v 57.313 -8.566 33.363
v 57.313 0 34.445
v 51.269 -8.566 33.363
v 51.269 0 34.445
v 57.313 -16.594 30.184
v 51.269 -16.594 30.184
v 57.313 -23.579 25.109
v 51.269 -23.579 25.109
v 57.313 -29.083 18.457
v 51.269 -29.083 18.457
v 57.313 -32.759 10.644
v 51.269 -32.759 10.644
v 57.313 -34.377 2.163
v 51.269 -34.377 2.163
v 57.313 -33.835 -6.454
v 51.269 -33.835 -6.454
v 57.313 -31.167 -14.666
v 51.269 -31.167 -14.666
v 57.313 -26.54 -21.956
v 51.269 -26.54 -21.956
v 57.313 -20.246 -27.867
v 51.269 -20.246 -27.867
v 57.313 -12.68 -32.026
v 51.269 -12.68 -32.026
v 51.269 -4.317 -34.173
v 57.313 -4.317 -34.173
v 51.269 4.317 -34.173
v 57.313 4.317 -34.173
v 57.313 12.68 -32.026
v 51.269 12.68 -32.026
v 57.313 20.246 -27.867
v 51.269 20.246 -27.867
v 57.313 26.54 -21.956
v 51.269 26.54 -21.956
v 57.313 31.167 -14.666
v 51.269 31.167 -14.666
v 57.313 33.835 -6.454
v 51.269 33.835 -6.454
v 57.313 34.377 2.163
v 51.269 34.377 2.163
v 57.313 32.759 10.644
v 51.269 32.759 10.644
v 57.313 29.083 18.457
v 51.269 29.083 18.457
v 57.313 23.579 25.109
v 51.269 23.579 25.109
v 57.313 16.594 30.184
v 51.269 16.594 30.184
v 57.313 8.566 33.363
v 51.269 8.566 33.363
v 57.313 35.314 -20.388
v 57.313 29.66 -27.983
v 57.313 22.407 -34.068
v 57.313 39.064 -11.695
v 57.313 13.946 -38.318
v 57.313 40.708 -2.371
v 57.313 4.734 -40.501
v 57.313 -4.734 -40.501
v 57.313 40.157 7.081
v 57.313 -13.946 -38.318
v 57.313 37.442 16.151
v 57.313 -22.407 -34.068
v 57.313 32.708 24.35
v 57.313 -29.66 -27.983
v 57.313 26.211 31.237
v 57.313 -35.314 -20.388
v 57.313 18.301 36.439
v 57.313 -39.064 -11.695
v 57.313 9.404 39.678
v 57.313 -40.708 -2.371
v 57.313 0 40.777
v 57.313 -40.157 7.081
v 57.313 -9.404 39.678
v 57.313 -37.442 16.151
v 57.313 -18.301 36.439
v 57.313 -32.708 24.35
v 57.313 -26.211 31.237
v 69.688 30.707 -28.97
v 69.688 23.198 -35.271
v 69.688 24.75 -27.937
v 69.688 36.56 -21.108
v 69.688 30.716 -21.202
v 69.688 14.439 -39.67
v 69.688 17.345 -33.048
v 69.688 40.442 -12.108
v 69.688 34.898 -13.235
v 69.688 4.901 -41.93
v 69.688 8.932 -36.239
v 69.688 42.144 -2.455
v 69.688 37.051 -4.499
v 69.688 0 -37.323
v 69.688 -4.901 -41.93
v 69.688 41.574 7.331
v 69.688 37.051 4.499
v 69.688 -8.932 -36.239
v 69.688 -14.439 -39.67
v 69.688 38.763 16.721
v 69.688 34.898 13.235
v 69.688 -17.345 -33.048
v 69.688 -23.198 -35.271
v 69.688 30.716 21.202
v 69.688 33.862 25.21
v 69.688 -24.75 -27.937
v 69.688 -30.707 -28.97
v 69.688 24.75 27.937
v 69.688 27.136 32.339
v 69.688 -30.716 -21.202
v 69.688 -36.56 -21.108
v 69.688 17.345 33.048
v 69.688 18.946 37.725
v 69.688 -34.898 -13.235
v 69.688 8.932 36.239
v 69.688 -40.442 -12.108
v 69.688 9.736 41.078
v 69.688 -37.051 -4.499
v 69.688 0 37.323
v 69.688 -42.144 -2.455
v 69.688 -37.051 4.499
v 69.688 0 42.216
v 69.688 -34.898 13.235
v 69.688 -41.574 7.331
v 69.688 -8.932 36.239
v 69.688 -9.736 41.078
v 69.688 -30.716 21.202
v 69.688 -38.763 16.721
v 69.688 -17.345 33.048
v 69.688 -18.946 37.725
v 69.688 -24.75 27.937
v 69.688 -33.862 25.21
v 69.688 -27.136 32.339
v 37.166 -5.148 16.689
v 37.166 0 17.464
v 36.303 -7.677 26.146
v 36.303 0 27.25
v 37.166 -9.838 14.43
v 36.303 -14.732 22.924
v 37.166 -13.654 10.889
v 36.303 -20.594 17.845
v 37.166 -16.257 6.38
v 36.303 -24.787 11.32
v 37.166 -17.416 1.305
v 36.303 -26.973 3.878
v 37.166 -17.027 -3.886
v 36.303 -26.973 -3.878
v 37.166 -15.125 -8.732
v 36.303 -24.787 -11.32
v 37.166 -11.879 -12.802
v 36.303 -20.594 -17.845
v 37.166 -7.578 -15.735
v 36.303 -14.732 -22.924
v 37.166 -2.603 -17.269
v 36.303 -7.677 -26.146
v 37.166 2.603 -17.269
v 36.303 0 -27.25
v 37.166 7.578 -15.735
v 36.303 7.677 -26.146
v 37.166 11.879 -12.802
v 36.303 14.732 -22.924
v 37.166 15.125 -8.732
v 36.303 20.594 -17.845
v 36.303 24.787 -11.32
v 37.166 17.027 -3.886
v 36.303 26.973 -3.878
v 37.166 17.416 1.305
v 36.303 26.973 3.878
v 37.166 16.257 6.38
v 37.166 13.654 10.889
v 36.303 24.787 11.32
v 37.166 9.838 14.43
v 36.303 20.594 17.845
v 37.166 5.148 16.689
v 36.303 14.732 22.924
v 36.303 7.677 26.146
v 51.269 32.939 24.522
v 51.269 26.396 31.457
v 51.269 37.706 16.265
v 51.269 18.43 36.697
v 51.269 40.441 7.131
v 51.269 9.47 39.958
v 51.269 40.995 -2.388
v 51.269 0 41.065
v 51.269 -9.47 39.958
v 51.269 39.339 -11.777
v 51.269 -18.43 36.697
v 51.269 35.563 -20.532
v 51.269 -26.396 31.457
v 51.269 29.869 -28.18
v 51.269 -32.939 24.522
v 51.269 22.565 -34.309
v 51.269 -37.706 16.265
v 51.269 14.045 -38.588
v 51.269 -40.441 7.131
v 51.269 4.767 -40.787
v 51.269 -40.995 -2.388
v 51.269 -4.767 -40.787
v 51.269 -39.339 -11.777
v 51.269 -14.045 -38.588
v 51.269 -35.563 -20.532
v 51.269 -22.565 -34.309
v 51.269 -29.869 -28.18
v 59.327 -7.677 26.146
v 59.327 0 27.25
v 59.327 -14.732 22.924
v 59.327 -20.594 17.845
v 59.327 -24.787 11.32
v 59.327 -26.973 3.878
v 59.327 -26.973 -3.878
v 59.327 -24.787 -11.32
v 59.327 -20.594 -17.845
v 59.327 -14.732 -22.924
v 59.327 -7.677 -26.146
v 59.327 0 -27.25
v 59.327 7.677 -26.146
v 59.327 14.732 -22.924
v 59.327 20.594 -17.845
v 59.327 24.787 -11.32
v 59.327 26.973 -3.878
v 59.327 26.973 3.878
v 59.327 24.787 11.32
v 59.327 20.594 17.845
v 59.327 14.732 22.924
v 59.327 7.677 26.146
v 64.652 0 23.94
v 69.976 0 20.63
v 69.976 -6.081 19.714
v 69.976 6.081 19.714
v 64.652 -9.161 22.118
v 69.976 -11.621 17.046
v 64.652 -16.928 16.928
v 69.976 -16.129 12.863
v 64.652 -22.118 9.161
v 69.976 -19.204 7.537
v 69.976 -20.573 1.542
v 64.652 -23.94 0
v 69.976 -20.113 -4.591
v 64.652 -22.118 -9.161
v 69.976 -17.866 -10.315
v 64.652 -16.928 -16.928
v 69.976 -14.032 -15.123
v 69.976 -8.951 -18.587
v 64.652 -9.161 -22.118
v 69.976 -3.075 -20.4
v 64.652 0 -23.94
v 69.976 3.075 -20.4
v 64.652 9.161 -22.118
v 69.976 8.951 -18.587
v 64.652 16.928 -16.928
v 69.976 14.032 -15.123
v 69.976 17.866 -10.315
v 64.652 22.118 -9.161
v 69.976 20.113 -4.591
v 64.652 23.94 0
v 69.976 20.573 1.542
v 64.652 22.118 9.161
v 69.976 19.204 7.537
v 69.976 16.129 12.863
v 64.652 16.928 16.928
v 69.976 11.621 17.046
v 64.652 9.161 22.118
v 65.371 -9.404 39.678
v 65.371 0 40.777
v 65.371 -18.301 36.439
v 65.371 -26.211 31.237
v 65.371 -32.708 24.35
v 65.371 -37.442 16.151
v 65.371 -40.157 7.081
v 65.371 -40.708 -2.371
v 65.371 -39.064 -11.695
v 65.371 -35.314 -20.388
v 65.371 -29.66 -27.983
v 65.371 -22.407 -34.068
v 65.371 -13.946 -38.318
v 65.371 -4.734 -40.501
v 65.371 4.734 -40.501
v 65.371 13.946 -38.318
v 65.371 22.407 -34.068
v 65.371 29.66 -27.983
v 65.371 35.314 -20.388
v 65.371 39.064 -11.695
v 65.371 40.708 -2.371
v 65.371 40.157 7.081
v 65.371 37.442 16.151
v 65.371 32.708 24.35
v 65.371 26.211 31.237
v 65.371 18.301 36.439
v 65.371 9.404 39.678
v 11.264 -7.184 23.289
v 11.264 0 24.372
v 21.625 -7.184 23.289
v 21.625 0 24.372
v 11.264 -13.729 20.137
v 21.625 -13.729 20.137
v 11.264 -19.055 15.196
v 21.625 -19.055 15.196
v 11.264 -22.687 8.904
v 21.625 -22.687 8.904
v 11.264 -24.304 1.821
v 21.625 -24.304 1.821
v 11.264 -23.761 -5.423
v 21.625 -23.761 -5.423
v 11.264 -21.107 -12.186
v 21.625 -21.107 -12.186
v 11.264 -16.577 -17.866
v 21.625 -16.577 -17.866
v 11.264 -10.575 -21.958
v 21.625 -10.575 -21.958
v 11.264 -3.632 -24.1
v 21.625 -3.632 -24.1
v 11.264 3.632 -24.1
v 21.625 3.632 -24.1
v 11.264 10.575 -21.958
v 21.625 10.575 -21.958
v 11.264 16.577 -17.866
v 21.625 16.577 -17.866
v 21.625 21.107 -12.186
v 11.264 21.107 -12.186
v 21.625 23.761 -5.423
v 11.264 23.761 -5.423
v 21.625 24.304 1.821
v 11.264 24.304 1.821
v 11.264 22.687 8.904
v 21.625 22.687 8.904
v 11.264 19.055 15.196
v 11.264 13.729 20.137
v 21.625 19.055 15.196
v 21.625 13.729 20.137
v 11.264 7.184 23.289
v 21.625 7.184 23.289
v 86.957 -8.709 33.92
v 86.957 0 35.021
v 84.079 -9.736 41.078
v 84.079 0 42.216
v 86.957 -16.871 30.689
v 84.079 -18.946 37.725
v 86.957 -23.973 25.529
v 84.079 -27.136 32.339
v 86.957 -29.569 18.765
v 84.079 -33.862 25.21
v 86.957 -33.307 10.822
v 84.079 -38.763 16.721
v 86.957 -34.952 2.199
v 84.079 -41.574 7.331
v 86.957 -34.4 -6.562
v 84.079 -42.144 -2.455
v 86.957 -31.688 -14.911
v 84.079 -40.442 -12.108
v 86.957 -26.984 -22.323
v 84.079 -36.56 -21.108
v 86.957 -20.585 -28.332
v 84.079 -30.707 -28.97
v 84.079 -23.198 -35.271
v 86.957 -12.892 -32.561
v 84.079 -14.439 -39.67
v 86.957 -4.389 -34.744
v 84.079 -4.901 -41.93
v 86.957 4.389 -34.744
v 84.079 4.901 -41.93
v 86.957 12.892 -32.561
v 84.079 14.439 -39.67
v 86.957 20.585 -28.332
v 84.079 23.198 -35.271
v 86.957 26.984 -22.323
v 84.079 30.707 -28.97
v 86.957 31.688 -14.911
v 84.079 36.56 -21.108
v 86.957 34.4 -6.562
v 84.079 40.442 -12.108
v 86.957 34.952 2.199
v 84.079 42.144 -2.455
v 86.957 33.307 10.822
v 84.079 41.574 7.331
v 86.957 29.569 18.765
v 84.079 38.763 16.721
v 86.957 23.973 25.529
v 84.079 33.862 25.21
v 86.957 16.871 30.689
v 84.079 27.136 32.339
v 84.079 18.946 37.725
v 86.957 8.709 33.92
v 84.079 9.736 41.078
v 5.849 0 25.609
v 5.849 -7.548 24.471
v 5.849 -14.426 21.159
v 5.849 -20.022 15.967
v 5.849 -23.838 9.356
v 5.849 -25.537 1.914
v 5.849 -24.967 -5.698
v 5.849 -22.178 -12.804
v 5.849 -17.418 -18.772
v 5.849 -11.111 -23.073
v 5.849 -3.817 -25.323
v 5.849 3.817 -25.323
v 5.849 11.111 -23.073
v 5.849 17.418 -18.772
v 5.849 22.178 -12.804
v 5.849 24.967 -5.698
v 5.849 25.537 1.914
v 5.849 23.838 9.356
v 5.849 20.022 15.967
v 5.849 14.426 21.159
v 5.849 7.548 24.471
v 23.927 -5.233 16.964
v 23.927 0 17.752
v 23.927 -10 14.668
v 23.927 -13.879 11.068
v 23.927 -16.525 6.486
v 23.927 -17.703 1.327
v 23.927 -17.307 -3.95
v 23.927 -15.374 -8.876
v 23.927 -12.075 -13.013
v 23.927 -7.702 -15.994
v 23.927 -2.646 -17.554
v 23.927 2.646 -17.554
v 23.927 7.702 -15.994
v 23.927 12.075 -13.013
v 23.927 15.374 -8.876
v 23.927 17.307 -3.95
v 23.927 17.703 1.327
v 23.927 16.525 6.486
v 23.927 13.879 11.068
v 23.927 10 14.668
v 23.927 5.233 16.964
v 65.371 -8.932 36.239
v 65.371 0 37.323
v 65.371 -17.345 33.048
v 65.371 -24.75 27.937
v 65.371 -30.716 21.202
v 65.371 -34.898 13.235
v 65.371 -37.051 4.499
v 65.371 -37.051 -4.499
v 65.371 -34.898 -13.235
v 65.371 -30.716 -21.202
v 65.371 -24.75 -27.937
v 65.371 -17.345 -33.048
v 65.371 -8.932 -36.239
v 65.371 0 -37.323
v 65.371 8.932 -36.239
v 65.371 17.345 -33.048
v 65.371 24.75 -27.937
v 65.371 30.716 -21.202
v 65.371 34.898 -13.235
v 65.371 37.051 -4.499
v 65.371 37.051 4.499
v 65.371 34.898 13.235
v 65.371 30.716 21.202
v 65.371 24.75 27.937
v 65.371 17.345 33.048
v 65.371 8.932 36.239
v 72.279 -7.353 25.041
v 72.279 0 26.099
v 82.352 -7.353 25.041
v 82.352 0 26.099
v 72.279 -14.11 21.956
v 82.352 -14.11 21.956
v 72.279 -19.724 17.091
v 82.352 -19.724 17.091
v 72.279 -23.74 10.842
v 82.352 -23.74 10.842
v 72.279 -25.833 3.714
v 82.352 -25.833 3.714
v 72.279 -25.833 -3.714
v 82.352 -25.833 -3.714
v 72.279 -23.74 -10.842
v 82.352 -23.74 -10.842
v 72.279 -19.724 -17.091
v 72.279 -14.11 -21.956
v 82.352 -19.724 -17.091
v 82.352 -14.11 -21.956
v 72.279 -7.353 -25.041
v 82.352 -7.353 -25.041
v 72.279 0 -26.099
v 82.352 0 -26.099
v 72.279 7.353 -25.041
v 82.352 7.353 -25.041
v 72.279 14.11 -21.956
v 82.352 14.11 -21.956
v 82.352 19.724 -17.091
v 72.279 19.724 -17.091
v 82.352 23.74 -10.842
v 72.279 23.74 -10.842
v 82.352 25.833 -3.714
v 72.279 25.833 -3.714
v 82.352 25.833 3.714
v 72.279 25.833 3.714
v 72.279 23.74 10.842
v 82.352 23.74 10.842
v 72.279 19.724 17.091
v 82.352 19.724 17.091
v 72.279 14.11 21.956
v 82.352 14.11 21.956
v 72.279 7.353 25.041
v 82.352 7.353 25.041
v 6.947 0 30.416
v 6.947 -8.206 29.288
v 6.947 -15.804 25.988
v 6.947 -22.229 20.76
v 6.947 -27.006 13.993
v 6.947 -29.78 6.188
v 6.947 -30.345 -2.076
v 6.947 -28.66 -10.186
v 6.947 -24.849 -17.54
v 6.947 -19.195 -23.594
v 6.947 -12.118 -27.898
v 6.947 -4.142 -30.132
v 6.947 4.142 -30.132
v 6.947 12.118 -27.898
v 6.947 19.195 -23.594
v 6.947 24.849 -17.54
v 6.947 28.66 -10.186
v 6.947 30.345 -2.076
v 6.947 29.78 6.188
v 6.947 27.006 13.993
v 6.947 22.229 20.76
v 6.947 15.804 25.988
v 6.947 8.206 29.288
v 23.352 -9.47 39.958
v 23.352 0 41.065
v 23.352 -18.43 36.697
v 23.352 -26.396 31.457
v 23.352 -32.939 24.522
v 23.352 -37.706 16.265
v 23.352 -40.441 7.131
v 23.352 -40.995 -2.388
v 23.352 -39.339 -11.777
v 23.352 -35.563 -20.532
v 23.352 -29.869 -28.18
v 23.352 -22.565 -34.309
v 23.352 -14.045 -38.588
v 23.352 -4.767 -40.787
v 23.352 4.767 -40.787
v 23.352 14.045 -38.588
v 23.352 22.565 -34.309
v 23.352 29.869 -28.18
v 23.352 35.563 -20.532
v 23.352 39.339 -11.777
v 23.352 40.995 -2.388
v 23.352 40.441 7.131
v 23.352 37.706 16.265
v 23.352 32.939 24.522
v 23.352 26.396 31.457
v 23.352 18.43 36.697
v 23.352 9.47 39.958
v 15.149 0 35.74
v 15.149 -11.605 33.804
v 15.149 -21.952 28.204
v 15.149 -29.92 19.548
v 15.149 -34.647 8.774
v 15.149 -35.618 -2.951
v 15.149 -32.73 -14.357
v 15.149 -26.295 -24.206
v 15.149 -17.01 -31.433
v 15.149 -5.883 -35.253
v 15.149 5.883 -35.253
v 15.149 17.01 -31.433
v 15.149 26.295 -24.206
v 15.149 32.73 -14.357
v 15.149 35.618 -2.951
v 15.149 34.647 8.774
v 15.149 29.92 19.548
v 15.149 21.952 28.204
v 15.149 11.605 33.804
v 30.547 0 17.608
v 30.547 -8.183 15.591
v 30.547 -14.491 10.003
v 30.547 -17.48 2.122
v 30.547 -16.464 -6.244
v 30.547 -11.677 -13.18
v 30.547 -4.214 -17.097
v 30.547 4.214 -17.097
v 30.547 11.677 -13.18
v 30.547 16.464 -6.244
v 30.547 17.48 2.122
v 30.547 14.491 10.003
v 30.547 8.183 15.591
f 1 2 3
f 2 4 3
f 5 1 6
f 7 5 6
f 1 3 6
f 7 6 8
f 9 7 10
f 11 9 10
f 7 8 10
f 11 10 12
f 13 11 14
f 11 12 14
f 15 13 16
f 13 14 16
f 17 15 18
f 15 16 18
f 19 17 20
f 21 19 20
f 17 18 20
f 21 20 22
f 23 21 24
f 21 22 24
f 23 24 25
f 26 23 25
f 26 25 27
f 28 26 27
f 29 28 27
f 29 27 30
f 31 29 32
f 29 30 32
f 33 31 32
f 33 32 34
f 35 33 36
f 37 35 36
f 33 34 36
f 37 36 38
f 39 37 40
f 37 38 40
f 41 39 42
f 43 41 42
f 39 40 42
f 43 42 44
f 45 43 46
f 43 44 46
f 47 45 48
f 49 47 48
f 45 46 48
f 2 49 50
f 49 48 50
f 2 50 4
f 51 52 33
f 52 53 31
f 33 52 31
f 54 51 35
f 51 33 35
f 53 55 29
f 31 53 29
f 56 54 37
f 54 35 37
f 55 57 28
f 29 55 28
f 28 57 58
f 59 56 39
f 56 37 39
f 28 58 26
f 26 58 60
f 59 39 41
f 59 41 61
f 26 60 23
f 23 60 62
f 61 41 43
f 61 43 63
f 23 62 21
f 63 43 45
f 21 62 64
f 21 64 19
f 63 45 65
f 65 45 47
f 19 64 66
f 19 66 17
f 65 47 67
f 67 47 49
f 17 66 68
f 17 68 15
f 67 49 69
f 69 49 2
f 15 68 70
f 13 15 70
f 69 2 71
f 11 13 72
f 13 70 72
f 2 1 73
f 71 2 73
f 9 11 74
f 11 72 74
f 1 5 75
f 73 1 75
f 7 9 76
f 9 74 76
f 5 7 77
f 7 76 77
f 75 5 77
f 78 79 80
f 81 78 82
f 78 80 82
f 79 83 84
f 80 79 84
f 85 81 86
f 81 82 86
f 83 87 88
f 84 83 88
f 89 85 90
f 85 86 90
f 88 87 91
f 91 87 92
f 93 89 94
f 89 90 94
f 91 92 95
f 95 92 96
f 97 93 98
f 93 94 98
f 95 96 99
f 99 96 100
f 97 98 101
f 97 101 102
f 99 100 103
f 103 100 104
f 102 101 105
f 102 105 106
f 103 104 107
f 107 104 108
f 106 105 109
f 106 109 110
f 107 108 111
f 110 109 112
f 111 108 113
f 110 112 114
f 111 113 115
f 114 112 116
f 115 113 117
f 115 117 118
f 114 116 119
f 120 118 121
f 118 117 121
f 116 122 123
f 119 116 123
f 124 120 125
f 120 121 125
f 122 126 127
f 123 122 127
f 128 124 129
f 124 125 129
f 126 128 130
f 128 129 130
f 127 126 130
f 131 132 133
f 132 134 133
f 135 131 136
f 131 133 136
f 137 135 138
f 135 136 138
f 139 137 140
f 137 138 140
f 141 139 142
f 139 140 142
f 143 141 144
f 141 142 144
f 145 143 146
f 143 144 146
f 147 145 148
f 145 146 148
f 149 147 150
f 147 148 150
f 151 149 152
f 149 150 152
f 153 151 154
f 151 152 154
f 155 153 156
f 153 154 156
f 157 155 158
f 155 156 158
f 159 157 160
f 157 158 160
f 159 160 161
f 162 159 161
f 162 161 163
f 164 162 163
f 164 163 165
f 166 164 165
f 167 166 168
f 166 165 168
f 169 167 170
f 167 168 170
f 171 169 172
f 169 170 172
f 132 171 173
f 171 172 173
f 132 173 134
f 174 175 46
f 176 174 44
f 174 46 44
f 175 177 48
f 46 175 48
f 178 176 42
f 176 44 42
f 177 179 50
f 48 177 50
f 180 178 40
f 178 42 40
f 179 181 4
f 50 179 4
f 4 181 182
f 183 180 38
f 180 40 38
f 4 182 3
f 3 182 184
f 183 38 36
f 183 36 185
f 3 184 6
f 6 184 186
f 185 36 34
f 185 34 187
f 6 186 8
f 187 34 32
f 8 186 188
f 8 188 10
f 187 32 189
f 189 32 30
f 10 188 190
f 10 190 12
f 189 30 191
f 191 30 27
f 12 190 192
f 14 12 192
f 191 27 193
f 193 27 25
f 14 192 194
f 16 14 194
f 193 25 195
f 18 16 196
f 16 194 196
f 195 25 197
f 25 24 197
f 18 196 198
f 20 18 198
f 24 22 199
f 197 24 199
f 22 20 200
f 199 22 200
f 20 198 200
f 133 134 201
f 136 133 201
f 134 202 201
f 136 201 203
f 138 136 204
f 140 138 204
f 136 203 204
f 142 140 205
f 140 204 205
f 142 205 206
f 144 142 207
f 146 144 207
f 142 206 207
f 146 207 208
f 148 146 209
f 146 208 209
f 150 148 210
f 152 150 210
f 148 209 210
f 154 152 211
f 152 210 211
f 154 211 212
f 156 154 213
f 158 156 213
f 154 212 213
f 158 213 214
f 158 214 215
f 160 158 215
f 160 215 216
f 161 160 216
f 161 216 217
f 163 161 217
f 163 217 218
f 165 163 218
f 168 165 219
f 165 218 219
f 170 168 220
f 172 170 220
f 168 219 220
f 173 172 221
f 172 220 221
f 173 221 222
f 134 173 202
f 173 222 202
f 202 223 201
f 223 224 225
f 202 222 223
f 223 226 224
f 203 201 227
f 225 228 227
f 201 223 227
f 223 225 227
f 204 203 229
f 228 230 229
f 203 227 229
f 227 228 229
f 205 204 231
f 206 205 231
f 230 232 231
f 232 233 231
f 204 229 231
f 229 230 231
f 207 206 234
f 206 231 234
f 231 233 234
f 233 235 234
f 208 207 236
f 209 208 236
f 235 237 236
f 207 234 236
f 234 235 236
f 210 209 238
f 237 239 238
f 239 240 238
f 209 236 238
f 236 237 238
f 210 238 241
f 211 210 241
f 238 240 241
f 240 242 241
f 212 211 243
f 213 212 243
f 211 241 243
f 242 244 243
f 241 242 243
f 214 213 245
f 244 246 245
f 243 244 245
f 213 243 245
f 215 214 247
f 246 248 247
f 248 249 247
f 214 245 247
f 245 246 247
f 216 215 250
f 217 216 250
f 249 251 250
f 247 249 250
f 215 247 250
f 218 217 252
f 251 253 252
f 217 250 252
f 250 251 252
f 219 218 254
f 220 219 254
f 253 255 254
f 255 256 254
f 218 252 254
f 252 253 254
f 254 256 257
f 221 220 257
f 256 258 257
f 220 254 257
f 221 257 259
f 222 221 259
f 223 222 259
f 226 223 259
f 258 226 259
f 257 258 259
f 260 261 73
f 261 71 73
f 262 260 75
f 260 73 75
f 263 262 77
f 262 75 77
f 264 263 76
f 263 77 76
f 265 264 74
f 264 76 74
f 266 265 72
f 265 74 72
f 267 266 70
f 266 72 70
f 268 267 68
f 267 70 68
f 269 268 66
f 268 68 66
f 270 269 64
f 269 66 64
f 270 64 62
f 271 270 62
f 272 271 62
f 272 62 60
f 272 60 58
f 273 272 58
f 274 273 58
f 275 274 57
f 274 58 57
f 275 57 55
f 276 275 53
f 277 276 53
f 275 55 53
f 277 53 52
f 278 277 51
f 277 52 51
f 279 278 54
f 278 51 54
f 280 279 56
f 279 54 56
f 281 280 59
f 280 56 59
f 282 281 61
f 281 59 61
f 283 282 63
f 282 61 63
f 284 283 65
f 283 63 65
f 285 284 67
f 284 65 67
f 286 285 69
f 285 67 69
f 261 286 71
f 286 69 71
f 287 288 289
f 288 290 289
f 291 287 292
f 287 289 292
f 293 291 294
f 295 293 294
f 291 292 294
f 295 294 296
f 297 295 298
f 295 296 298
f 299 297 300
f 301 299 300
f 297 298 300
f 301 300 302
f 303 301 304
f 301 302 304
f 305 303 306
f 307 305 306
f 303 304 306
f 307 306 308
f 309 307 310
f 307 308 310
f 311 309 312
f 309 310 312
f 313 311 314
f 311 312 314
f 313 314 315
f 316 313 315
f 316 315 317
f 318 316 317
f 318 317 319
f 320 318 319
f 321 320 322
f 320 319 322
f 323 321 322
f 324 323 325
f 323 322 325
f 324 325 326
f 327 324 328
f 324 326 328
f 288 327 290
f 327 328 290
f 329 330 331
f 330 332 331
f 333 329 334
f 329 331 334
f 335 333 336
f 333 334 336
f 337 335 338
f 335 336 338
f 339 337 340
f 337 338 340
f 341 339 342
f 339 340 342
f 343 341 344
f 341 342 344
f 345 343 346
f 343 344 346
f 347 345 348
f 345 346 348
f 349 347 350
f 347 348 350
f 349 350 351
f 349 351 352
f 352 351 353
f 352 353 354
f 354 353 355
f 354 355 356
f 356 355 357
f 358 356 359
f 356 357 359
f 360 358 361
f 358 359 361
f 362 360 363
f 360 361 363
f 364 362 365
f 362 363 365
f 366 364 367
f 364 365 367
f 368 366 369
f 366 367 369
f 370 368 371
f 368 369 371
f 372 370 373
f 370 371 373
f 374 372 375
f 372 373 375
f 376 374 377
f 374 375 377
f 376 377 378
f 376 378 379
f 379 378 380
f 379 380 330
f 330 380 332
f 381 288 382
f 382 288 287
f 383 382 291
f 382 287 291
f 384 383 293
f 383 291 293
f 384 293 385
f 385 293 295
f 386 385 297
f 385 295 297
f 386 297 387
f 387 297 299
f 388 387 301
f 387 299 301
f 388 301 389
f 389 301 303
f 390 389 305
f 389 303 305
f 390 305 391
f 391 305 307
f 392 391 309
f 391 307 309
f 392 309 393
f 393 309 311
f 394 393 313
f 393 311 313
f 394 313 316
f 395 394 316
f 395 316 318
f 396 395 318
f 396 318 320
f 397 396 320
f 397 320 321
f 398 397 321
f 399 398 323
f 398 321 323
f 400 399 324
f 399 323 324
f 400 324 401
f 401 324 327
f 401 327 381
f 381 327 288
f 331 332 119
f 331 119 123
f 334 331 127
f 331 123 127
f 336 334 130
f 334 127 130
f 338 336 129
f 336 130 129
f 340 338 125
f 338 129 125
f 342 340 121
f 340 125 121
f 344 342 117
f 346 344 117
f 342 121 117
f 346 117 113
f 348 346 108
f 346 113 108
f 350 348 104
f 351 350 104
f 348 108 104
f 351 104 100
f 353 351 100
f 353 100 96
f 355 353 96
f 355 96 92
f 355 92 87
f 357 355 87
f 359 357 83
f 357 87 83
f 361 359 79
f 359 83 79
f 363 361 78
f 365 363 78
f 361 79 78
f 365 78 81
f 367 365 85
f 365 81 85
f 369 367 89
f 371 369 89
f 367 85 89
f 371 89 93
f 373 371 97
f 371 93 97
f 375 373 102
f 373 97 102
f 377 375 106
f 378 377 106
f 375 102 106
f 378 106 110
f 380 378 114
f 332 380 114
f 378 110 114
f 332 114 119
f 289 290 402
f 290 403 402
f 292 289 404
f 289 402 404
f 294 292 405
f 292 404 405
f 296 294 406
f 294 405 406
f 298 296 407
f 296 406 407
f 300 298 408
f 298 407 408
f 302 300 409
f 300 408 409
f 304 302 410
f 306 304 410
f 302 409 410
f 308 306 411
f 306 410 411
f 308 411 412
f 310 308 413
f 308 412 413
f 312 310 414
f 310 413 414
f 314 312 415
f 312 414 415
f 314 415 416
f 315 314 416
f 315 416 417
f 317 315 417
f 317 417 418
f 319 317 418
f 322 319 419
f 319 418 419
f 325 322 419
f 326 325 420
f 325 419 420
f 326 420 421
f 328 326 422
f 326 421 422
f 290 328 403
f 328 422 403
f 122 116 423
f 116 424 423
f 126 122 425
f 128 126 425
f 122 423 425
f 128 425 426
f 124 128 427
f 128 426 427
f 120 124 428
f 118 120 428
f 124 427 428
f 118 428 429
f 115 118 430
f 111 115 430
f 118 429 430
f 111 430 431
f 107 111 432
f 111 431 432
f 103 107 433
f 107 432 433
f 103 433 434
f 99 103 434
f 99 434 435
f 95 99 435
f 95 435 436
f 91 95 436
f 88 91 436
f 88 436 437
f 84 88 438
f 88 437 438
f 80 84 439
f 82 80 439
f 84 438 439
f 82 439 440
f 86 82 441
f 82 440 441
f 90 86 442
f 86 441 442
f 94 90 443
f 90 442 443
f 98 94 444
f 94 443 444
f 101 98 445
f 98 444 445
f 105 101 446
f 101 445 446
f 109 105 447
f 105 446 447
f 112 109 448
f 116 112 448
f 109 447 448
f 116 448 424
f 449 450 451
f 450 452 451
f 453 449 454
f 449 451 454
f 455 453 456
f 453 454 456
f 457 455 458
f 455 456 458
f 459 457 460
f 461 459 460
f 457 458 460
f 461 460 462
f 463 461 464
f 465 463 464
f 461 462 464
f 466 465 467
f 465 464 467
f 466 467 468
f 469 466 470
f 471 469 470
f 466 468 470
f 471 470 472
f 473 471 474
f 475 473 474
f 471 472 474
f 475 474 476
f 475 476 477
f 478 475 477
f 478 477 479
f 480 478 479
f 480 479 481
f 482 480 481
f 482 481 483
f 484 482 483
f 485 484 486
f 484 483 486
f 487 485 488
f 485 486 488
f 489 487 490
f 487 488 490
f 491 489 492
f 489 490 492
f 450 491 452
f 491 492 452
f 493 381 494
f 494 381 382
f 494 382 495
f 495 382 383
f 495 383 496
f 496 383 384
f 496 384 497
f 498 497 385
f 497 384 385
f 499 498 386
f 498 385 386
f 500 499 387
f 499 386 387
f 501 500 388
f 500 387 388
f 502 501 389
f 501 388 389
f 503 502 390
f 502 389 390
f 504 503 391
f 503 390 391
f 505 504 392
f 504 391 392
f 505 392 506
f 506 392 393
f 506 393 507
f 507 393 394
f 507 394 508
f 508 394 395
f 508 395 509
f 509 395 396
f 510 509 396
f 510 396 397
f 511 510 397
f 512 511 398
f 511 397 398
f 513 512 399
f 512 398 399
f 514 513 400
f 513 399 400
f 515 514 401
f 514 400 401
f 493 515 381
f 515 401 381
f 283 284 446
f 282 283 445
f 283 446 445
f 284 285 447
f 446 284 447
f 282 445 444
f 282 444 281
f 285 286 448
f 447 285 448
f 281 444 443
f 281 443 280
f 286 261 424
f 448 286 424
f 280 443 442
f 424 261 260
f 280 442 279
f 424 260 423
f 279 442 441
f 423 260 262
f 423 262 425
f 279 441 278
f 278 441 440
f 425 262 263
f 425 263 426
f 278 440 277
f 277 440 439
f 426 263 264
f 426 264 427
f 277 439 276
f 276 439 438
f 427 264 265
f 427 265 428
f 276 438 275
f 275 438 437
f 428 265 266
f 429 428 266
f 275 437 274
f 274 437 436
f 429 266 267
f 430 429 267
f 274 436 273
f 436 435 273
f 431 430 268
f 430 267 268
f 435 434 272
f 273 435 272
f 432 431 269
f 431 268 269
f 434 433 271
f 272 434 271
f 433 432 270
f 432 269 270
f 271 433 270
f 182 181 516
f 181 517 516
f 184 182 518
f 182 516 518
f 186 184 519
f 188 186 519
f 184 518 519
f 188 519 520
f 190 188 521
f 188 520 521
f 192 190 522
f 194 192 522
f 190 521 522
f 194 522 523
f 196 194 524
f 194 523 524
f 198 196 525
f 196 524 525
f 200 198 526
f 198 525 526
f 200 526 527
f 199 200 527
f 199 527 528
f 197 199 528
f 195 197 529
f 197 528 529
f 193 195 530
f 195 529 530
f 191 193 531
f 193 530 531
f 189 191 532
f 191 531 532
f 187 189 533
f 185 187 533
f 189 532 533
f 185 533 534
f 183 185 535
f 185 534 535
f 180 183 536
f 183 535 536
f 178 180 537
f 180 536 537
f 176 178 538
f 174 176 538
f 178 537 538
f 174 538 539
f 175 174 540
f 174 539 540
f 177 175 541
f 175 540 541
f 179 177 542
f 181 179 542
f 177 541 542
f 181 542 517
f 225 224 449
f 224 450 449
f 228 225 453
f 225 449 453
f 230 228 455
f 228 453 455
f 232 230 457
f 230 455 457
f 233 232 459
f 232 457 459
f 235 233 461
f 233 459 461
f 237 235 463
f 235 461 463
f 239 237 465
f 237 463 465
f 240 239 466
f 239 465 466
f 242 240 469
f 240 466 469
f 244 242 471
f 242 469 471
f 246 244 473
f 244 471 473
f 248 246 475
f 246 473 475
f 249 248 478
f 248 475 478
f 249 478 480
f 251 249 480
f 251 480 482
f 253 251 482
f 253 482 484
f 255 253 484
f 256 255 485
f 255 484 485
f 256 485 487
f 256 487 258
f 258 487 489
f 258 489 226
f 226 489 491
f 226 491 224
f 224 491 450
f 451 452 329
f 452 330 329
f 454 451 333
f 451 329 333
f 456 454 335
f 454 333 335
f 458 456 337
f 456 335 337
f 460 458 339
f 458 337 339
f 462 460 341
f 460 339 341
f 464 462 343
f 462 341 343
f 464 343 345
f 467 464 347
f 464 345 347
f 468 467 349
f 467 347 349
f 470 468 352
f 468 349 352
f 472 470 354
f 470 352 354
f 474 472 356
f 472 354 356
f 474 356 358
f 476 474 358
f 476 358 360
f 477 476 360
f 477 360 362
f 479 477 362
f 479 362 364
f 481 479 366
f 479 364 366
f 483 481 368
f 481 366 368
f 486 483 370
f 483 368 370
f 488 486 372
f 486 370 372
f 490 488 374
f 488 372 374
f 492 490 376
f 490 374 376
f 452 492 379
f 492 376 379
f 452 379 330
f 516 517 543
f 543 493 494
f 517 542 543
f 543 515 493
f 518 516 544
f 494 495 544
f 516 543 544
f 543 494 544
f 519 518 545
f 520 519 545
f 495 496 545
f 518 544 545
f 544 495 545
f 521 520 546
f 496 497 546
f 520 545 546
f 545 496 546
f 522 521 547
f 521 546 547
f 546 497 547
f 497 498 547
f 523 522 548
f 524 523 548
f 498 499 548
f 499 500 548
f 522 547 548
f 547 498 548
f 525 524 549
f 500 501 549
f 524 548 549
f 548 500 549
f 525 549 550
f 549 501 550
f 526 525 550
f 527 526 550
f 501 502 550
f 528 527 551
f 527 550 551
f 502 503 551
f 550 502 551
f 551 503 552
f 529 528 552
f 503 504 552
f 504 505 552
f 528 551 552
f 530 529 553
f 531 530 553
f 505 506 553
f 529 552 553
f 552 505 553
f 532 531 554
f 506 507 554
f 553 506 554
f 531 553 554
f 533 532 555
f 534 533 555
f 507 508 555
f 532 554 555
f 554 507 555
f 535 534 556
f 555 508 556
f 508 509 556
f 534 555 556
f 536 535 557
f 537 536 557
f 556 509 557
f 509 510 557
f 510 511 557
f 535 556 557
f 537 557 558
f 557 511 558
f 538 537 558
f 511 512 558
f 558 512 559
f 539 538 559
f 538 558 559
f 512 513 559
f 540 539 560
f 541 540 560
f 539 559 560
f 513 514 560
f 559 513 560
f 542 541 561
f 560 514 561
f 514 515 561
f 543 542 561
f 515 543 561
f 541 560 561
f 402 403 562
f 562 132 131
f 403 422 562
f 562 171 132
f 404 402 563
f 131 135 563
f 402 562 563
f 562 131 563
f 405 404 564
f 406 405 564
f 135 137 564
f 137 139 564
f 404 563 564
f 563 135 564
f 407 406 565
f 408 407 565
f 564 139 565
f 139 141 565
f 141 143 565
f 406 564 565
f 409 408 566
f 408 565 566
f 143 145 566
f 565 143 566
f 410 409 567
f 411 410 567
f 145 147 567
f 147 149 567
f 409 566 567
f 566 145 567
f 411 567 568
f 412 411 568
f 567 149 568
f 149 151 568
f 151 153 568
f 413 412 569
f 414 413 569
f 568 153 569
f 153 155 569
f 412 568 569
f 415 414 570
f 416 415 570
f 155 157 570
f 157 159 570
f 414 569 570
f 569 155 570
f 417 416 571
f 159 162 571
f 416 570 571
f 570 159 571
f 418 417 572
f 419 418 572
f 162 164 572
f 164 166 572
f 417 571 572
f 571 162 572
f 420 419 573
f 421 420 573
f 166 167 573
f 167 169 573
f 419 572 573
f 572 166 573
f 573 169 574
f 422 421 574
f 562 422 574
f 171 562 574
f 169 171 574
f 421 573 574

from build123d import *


with BuildPart() as f1:
    # F0 (on Front) → F1 (revolve)
    with BuildSketch(Plane.XZ):
        Polygon((6.946762, 30.415747), (5.848836, 25.608581), (11.263847, 24.371827), (21.624854, 24.371827), (23.927299, 17.752293), (37.166368, 17.464489), (36.30295, 27.249882), (59.327412, 27.249882), (69.976225, 20.63035), (72.278671, 26.098661), (82.351863, 26.098661), (86.956762, 35.020638), (84.078699, 42.215787), (75.444527, 42.215787), (69.688417, 42.215787), (69.688417, 37.323084), (65.371335, 37.323084), (65.371335, 40.776756), (57.312772, 40.776756), (57.312772, 34.445029), (51.268846, 34.445029), (51.268846, 41.06456), (23.351688, 41.06456), align=None)
    revolve(axis=Axis((38.350116, 0, 0), (1, 0, 0)))


solid = f1.part
